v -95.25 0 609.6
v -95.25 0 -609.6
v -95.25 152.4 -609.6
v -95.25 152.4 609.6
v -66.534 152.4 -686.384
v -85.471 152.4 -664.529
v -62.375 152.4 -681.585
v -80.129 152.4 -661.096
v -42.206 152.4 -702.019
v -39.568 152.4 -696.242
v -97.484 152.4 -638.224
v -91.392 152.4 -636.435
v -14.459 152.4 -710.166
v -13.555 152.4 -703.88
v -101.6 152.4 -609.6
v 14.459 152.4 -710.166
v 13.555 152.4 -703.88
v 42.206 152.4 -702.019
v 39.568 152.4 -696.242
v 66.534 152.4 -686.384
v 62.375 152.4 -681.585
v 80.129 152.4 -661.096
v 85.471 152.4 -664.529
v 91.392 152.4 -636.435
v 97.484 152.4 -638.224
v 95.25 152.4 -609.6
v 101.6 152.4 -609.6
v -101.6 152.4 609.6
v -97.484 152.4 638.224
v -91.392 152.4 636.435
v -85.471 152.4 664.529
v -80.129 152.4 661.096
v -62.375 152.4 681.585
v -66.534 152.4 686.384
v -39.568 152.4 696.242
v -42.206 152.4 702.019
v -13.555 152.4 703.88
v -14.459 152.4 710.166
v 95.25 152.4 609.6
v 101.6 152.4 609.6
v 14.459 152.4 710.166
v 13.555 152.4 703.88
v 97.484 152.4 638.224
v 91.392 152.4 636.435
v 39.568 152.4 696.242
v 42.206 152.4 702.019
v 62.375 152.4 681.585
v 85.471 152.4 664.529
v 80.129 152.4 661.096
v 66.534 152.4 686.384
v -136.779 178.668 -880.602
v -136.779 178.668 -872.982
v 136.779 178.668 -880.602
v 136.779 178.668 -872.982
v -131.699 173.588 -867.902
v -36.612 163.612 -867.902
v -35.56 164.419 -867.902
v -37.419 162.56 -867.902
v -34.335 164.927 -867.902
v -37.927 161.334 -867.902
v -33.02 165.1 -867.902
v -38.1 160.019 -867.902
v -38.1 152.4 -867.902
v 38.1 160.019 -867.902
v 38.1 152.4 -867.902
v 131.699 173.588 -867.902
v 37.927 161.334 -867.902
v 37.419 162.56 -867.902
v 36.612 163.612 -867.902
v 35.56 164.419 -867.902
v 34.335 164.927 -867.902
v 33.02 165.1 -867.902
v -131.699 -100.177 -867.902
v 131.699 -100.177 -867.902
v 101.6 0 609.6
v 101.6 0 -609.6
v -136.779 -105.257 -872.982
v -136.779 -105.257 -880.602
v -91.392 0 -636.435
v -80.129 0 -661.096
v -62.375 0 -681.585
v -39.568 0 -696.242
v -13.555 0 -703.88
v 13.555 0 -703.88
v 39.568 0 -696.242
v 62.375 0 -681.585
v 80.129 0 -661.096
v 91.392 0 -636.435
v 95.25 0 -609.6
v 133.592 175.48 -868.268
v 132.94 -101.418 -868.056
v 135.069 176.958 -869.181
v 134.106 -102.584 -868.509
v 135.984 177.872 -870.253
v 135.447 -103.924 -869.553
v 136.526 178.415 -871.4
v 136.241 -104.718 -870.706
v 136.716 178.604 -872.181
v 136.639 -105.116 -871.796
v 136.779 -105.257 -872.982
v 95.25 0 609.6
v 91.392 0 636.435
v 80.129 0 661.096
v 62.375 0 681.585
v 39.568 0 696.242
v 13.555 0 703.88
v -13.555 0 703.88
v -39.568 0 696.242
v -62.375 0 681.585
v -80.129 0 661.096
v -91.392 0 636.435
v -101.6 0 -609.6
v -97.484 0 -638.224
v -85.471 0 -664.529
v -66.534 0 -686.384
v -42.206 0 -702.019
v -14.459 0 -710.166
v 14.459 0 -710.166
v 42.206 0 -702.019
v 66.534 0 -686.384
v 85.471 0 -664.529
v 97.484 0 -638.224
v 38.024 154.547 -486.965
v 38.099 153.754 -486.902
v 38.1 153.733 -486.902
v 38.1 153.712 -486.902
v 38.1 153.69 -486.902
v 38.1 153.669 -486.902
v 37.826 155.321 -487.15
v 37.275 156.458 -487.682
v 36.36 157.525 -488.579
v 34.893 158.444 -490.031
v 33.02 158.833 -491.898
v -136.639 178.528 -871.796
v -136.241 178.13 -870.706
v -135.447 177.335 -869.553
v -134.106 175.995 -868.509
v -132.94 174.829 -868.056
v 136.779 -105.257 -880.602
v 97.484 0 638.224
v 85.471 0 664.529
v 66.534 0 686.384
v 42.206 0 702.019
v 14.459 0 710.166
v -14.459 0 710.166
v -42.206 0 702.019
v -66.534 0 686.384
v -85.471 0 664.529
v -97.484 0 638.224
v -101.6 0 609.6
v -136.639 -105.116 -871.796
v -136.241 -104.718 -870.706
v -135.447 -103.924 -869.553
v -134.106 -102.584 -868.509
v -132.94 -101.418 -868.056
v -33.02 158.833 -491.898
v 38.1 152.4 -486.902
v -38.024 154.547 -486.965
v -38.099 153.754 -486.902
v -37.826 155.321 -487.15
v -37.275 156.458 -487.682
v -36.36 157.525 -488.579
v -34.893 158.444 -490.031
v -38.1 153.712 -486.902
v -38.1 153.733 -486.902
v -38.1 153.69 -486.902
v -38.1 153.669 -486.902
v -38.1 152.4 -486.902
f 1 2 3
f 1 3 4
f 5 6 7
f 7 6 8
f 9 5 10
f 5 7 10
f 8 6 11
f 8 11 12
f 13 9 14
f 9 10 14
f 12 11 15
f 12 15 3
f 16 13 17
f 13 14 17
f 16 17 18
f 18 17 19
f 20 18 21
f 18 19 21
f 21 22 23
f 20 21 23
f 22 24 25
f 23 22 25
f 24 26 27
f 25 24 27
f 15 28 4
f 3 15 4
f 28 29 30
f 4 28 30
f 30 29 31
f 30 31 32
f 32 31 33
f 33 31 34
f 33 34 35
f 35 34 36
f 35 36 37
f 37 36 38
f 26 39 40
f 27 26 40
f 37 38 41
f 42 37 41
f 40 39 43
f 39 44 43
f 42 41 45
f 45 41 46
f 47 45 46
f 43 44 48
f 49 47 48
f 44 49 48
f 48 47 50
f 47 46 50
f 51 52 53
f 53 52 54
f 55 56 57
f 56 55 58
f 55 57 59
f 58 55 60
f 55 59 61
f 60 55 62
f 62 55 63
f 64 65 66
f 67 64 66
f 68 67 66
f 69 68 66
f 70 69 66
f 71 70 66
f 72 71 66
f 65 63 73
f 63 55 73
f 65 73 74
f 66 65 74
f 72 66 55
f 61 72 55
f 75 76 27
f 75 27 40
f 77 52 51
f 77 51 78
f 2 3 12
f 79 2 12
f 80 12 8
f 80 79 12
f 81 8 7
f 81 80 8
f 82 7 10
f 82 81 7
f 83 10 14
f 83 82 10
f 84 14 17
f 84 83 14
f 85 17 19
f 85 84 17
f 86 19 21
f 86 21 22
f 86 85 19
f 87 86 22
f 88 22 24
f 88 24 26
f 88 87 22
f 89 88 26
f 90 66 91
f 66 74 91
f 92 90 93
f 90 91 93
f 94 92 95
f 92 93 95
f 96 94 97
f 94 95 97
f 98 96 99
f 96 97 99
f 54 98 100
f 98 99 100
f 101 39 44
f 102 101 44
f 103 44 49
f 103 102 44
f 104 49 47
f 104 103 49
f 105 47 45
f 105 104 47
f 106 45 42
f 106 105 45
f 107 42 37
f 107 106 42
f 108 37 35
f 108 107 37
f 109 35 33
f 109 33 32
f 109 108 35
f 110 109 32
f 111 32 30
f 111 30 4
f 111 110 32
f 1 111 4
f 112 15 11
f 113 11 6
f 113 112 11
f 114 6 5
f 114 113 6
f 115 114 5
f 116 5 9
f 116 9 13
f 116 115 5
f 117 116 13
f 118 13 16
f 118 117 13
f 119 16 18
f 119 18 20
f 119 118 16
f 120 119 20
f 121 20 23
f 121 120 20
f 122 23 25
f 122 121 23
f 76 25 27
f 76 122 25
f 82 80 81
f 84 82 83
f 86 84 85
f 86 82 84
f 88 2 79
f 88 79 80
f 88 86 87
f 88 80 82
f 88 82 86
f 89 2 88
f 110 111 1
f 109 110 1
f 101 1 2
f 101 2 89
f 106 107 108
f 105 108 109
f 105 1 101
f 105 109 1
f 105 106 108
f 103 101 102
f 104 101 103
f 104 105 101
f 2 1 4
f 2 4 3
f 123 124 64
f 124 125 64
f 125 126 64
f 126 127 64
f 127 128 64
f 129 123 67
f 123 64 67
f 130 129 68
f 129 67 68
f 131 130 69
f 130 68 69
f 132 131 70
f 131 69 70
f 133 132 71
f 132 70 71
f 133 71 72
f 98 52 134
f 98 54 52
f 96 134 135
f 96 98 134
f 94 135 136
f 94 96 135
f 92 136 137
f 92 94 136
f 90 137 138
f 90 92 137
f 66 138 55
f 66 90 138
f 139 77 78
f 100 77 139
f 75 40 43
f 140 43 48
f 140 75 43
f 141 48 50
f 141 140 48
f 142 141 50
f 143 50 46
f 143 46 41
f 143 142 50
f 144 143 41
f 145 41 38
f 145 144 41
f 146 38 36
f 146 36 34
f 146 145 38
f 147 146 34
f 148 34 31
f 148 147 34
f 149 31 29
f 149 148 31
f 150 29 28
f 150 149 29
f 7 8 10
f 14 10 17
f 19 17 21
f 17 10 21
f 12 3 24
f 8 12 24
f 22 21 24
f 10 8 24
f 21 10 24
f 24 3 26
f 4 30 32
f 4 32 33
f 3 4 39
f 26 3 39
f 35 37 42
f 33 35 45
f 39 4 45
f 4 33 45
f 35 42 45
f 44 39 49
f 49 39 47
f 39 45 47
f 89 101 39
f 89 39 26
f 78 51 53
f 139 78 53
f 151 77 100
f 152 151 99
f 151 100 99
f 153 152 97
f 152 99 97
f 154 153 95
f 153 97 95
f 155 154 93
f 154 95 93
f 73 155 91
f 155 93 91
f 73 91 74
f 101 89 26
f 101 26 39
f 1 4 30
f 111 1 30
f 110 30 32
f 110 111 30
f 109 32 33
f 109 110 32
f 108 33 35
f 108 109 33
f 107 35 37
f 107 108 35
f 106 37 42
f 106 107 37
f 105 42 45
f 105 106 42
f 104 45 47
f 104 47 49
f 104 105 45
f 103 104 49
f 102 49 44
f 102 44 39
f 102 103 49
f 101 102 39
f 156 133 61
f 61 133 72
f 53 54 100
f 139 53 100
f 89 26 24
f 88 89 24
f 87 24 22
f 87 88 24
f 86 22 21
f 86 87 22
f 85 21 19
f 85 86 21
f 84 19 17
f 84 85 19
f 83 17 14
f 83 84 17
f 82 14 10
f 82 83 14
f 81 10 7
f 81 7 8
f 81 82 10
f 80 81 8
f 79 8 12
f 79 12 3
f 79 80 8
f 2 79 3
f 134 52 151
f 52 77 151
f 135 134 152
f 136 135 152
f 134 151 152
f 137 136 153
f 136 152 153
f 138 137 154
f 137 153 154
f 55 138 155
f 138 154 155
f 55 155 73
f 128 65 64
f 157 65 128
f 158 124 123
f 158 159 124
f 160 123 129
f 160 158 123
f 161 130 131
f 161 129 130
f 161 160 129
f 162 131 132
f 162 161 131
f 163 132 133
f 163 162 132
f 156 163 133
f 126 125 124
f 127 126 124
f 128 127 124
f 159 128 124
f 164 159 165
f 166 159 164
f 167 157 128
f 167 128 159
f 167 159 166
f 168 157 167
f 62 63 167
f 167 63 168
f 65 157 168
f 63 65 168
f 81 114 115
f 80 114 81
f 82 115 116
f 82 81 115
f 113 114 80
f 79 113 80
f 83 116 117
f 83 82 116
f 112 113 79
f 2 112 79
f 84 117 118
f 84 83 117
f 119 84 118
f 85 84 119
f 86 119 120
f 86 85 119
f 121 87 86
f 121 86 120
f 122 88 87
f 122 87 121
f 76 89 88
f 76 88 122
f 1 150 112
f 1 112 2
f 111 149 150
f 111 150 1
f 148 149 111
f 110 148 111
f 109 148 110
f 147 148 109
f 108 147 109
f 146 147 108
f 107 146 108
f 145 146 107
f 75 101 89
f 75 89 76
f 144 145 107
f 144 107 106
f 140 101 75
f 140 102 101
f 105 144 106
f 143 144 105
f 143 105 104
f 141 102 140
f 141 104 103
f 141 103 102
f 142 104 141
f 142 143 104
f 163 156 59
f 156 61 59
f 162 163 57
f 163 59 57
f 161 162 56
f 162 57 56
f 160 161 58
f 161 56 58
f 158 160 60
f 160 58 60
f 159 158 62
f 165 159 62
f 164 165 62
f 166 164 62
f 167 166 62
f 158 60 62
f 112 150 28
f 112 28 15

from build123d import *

# Parameters (mm, degrees)
F1_DEPTH  = 152.4
F3_DEPTH  = 152.4
F4_W      = 76.2
F4_H      = 381
F5_DEPTH  = 12.7
F7_DEPTH  = 139.701
F8_R      = 5.08
F9_W      = 273.5587656498
F9_H      = 283.9249372482
F10_DEPTH = 12.7
F11_R     = 5.08


with BuildPart() as f1:
    # F0 (on Front) → F1 (new body)
    with BuildSketch(Plane.XZ):
        with BuildLine():
            ThreePointArc((101.6, 609.6), (0, 711.2), (-101.6, 609.6))
            Line((-101.6, 609.6), (-101.6, -609.6))
            ThreePointArc((-101.6, -609.6), (0, -711.2), (101.6, -609.6))
            Line((101.6, -609.6), (101.6, 609.6))
        make_face()
        with BuildLine():
            Line((-95.2500030398, -609.6), (-95.2500030398, 609.6))
            ThreePointArc((-95.2500030398, 609.6), (0, 704.8500030398), (95.2500030398, 609.6))
            Line((95.2500030398, 609.6), (95.2500030398, -609.6))
            ThreePointArc((95.2500030398, -609.6), (0, -704.8500030398), (-95.2500030398, -609.6))
        make_face(mode=Mode.SUBTRACT)
    extrude(amount=-F1_DEPTH)


with BuildPart() as f3:
    # F2 (on face) → F3 (new body)
    with BuildSketch(Plane.XZ):
        with BuildLine():
            ThreePointArc((-95.2500030398, -609.6), (0, -704.8500030398), (95.2500030398, -609.6))
            Line((95.2500030398, -609.6), (95.2500030398, 609.6))
            ThreePointArc((95.2500030398, 609.6), (0, 704.8500030398), (-95.2500030398, 609.6))
            Line((-95.2500030398, 609.6), (-95.2500030398, -609.6))
        make_face()
    extrude(amount=-F3_DEPTH)


with BuildPart() as f5:
    # F4 (on face) → F5 (new body)
    with BuildSketch(Plane(origin=(0, 152.4, 0), x_dir=(-1, 0, 0), z_dir=(0, 1, 0))):
        with Locations((0, -677.4023830414)):
            Rectangle(F4_W, F4_H)
    extrude(amount=F5_DEPTH)

    # F6 (on face) → F7 (cut, through all)
    with BuildSketch(Plane.YZ.offset(38.1)):
        Polygon((158.75, -486.9023830414), (165.1, -867.9023830414), (165.1, -486.9023830414), align=None)
    extrude(amount=-F7_DEPTH, mode=Mode.SUBTRACT)

    # F8
    f8_edges = [f5.edges().sort_by_distance(p)[0] for p in [
        (38.1, 161.925, -677.402383),
        (-38.1, 161.925, -677.402383),
        (0, 158.75, -486.902383),
    ]]
    fillet(f8_edges, radius=F8_R)

    # F9 (on face) → F10 (join)
    with BuildSketch(Plane(origin=(0, 0, -867.9023830414), x_dir=(1, 0, 0), z_dir=(0, 0, -1))):
        with Locations((0, -36.7056280375)):
            Rectangle(F9_W, F9_H)
    extrude(amount=F10_DEPTH)

    # F11
    f11_edges = [f5.edges().sort_by_distance(p)[0] for p in [
        (-136.779383, 36.705628, -867.902383),
        (0, -105.256841, -867.902383),
        (136.779383, 36.705628, -867.902383),
        (0, 178.668097, -867.902383),
    ]]
    fillet(f11_edges, radius=F11_R)


solid = Compound([f1.part, f3.part, f5.part])
